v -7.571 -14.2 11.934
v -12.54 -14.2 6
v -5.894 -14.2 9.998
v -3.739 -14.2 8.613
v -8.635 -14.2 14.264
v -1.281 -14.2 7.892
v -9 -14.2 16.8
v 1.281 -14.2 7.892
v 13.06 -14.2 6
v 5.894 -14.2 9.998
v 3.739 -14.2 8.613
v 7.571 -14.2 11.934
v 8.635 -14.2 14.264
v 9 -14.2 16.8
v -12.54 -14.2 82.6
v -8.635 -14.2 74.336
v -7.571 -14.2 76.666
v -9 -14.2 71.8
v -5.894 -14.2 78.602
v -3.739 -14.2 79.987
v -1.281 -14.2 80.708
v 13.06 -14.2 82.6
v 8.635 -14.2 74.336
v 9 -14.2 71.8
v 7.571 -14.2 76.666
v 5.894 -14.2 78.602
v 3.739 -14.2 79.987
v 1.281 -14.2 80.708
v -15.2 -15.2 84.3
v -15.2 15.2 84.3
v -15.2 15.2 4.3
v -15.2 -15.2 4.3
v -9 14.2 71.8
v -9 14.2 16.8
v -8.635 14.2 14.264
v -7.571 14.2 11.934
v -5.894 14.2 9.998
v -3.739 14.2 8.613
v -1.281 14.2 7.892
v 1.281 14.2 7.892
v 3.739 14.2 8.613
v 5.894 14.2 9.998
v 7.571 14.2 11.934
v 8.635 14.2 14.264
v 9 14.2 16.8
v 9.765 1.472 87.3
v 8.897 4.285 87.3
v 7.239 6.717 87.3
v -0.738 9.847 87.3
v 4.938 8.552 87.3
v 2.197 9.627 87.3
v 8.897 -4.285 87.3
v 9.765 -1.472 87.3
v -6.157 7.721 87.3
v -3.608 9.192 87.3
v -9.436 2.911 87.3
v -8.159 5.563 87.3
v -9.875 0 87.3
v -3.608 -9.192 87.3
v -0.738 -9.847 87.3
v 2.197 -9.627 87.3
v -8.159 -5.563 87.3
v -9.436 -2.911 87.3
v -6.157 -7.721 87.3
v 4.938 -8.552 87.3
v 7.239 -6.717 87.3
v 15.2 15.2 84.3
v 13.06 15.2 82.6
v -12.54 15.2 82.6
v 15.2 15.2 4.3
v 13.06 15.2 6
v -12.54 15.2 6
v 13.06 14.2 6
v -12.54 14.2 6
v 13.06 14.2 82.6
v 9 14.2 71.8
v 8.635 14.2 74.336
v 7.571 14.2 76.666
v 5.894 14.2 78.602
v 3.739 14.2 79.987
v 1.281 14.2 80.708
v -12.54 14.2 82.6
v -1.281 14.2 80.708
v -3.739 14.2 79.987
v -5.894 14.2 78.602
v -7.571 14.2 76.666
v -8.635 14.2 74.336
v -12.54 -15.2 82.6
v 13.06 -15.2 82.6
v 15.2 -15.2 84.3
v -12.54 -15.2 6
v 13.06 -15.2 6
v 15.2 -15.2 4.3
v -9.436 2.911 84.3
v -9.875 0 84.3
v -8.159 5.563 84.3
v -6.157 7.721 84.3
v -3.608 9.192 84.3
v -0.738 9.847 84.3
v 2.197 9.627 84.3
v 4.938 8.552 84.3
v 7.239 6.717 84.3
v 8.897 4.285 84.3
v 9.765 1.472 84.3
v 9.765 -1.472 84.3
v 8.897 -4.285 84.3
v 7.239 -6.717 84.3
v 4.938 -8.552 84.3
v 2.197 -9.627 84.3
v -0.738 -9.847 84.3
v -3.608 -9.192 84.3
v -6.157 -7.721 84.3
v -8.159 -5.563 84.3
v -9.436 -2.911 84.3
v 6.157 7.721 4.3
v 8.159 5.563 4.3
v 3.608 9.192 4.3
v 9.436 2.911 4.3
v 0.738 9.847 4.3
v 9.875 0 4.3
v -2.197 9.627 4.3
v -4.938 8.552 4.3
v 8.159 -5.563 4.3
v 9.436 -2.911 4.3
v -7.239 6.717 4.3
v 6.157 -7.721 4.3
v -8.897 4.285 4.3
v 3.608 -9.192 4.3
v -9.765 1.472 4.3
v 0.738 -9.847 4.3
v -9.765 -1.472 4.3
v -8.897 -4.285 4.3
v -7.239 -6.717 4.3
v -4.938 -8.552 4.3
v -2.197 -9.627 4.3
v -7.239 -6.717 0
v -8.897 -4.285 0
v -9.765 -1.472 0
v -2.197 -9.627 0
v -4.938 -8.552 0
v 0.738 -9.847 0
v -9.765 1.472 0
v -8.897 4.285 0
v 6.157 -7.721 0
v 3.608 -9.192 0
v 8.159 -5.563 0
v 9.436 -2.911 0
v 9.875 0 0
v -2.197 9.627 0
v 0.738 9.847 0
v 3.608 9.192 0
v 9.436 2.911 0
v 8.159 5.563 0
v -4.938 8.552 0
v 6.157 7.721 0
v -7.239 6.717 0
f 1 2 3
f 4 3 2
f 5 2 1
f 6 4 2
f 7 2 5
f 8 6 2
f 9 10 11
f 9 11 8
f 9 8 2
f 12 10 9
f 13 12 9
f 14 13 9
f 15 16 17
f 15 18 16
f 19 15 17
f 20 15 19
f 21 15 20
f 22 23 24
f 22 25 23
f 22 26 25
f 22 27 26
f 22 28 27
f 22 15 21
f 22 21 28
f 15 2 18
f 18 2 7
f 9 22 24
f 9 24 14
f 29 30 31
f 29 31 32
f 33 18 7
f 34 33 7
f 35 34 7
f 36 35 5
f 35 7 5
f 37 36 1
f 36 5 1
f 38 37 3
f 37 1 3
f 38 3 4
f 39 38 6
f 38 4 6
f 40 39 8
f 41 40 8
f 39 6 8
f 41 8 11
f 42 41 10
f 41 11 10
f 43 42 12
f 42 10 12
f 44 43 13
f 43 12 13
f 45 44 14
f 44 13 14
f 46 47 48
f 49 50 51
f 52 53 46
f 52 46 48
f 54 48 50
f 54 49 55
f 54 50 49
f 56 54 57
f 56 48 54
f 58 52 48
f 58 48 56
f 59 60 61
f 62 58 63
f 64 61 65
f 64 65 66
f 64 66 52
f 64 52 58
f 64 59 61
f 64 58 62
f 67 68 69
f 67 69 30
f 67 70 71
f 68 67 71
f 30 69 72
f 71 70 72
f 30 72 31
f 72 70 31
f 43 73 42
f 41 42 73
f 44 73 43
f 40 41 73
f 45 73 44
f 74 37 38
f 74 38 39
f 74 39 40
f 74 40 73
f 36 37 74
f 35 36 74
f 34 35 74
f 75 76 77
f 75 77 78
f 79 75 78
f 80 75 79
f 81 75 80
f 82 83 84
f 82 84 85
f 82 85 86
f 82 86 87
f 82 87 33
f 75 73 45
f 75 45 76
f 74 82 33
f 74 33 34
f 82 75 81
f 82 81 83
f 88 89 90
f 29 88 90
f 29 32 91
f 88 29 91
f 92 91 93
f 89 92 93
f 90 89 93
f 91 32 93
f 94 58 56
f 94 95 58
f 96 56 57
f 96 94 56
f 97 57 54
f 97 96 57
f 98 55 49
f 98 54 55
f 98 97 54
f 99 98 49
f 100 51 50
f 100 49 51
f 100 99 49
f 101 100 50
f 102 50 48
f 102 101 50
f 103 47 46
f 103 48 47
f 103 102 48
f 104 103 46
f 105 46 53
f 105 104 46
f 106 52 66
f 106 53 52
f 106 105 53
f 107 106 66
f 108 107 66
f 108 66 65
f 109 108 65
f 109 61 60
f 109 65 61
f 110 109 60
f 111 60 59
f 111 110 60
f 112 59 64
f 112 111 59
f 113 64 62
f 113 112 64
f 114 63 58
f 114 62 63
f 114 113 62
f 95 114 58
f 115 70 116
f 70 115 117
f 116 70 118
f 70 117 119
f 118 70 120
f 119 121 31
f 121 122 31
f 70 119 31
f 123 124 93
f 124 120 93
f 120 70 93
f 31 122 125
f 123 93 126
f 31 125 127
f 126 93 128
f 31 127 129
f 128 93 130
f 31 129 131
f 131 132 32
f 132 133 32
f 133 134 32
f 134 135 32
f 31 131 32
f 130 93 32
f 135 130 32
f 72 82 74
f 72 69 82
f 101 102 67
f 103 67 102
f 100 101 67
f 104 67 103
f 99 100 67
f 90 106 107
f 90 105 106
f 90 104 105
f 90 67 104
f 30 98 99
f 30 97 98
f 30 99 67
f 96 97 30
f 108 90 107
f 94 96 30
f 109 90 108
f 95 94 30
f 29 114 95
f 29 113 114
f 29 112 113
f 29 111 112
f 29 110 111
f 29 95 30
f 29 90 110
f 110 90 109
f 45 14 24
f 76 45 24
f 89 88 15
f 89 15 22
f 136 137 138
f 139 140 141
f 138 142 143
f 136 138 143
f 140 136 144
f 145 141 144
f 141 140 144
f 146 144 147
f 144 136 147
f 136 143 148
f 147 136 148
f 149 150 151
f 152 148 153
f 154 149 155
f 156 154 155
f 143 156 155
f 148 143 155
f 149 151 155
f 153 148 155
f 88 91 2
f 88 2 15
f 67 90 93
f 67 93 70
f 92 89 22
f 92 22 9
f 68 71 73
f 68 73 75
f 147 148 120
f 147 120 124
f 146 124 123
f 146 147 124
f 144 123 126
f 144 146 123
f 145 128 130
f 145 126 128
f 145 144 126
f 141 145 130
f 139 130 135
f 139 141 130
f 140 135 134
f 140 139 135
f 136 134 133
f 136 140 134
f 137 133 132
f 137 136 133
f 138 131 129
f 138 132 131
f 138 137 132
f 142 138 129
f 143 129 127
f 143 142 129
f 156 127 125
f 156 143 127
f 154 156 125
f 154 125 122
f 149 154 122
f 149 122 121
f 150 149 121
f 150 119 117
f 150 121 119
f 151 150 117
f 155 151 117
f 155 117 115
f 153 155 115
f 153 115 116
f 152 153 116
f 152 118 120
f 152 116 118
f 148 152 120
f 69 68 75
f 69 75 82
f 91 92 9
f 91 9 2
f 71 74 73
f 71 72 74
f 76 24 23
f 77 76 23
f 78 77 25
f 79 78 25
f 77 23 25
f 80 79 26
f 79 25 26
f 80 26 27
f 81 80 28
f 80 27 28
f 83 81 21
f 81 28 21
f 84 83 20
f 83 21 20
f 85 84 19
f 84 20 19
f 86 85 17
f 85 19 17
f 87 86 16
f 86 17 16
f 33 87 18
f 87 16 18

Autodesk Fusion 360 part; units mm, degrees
sketch "Sketch1" plane through (0, 0, 0) normal (0, 0, 1) x (1, 0, 0) in component "flow cell"
  circle A0 centre (0, 0) radius 9.875
  dimension "d1" = 19.75
extrude "Extrude1" add sketch "Sketch1" along normal blind 4.3 in component "flow cell"
sketch "Sketch2" plane through (0, 0, 4.3) normal (0, 0, 1) x (-1, 0, 0) in component "flow cell"
  circle A0 centre (0, 0) radius 9.875
  line L0 (12.7, 12.7) -> (-12.7, 12.7)
  line L1 (-12.7, 12.7) -> (-12.7, -12.7)
  line L2 (-12.7, -12.7) -> (12.7, -12.7)
  line L3 (12.7, -12.7) -> (12.7, 12.7)
  line L4 (12.7, 12.7) -> (-12.7, -12.7) construction
  line L5 (-12.7, 12.7) -> (12.7, -12.7) construction
  line L6 (13.7, 13.7) -> (-13.7, 13.7)
  line L7 (-13.7, 13.7) -> (-13.7, -13.7)
  line L8 (-13.7, -13.7) -> (13.7, -13.7)
  line L9 (13.7, -13.7) -> (13.7, 13.7)
  line L10 (15.2, 15.2) -> (-15.2, 15.2)
  line L11 (-15.2, 15.2) -> (-15.2, -15.2)
  line L12 (-15.2, -15.2) -> (15.2, -15.2)
  line L13 (15.2, -15.2) -> (15.2, 15.2)
  dimension "d4" = 25.4
  dimension "d5" = 25.4
  dimension "d6" = 1
  dimension "d7" = 2.5
extrude "Extrude2" add sketch "Sketch2" along normal blind 80 contours A0 | L0 L1 L2 L3 | L6 L7 L8 L9 | L10 L11 L12 L13 in component "flow cell"
sketch "Sketch3" plane through (0, 0, 84.3) normal (0, 0, 1) x (-1, 0, 0) in component "flow cell"
  line L0 (15.2, -15.2) -> (15.2, 15.2)
  line L1 (15.2, 15.2) -> (-15.2, 15.2)
  line L2 (-15.2, 15.2) -> (-15.2, -15.2)
  line L3 (-15.2, -15.2) -> (15.2, -15.2)
  circle A0 centre (0, 0) radius 9.875
  dimension "d10" = 19.75
extrude "Extrude3" add sketch "Sketch3" along normal blind 3 contours A0 in component "flow cell"
sketch "Sketch4" plane through (0, -15.2, 0) normal (0, -1, 0) x (1, 0, 0) in component "flow cell"
  line L0 (-15.2, 4.3) -> (15.2, 4.3)
  line L1 (15.2, 4.3) -> (15.2, 84.3)
  line L2 (15.2, 84.3) -> (-15.2, 84.3)
  line L3 (-15.2, 84.3) -> (-15.2, 4.3)
  line L4 (13.0604, 6) -> (-12.5396, 6)
  line L5 (-12.5396, 6) -> (-12.5396, 82.6)
  line L6 (-12.5396, 82.6) -> (13.0604, 82.6)
  line L7 (13.0604, 82.6) -> (13.0604, 6)
  line L8 (13.0604, 6) -> (-12.5396, 82.6) construction
  line L9 (-12.5396, 6) -> (13.0604, 82.6) construction
  line L10 (0.2604, 44.3) -> (-15.2, 44.3) construction
  point P0 (0.2604, 44.3)
  dimension "d13" = 25.6
  dimension "d14" = 76.6
extrude "Extrude4" cut sketch "Sketch4" against normal blind 1 contours L4 L5 L6 L7 in component "flow cell"
ref_plane "WorkPlane1" through (0, 0, 44.3) normal (0, -1, 0) x (1, 0, 0) in component "flow cell"
mirror "Mirror1" about plane through (0, 0, 44.3) normal (0, -1, 0) of "Extrude4" in component "flow cell"
sketch "Sketch5" plane through (0, -14.2, 0) normal (0, -1, 0) x (1, 0, 0) in component "flow cell"
  line L0 (13.0604, 82.6) -> (-12.5396, 82.6)
  line L1 (-12.5396, 82.6) -> (-12.5396, 6)
  line L2 (-12.5396, 6) -> (13.0604, 6)
  line L3 (13.0604, 6) -> (13.0604, 82.6)
  line L4 (-9, 71.8) -> (-9, 16.8)
  arc A0 (-9, 16.8) -> (9, 16.8) centre (0, 16.8) ccw
  line L5 (9, 16.8) -> (9, 71.8)
  arc A1 (9, 71.8) -> (-9, 71.8) centre (0, 71.8) ccw
  line L6 (0, 71.8) -> (0, 16.8) construction
  line L7 (-12.5396, 44.3) -> (0, 44.3)
  line L8 (0, 1.75) -> (0, 22.5)
  dimension "d19" = 55
  dimension "d20" = 18
extrude "Extrude5" cut sketch "Sketch5" against normal through all contours L4 A0 L5 A1 in component "flow cell"
component "flow cell" placed x (1, 0, 0) y (0, 1, 0) z (0, 0, 1) at (0, 0, 0)
